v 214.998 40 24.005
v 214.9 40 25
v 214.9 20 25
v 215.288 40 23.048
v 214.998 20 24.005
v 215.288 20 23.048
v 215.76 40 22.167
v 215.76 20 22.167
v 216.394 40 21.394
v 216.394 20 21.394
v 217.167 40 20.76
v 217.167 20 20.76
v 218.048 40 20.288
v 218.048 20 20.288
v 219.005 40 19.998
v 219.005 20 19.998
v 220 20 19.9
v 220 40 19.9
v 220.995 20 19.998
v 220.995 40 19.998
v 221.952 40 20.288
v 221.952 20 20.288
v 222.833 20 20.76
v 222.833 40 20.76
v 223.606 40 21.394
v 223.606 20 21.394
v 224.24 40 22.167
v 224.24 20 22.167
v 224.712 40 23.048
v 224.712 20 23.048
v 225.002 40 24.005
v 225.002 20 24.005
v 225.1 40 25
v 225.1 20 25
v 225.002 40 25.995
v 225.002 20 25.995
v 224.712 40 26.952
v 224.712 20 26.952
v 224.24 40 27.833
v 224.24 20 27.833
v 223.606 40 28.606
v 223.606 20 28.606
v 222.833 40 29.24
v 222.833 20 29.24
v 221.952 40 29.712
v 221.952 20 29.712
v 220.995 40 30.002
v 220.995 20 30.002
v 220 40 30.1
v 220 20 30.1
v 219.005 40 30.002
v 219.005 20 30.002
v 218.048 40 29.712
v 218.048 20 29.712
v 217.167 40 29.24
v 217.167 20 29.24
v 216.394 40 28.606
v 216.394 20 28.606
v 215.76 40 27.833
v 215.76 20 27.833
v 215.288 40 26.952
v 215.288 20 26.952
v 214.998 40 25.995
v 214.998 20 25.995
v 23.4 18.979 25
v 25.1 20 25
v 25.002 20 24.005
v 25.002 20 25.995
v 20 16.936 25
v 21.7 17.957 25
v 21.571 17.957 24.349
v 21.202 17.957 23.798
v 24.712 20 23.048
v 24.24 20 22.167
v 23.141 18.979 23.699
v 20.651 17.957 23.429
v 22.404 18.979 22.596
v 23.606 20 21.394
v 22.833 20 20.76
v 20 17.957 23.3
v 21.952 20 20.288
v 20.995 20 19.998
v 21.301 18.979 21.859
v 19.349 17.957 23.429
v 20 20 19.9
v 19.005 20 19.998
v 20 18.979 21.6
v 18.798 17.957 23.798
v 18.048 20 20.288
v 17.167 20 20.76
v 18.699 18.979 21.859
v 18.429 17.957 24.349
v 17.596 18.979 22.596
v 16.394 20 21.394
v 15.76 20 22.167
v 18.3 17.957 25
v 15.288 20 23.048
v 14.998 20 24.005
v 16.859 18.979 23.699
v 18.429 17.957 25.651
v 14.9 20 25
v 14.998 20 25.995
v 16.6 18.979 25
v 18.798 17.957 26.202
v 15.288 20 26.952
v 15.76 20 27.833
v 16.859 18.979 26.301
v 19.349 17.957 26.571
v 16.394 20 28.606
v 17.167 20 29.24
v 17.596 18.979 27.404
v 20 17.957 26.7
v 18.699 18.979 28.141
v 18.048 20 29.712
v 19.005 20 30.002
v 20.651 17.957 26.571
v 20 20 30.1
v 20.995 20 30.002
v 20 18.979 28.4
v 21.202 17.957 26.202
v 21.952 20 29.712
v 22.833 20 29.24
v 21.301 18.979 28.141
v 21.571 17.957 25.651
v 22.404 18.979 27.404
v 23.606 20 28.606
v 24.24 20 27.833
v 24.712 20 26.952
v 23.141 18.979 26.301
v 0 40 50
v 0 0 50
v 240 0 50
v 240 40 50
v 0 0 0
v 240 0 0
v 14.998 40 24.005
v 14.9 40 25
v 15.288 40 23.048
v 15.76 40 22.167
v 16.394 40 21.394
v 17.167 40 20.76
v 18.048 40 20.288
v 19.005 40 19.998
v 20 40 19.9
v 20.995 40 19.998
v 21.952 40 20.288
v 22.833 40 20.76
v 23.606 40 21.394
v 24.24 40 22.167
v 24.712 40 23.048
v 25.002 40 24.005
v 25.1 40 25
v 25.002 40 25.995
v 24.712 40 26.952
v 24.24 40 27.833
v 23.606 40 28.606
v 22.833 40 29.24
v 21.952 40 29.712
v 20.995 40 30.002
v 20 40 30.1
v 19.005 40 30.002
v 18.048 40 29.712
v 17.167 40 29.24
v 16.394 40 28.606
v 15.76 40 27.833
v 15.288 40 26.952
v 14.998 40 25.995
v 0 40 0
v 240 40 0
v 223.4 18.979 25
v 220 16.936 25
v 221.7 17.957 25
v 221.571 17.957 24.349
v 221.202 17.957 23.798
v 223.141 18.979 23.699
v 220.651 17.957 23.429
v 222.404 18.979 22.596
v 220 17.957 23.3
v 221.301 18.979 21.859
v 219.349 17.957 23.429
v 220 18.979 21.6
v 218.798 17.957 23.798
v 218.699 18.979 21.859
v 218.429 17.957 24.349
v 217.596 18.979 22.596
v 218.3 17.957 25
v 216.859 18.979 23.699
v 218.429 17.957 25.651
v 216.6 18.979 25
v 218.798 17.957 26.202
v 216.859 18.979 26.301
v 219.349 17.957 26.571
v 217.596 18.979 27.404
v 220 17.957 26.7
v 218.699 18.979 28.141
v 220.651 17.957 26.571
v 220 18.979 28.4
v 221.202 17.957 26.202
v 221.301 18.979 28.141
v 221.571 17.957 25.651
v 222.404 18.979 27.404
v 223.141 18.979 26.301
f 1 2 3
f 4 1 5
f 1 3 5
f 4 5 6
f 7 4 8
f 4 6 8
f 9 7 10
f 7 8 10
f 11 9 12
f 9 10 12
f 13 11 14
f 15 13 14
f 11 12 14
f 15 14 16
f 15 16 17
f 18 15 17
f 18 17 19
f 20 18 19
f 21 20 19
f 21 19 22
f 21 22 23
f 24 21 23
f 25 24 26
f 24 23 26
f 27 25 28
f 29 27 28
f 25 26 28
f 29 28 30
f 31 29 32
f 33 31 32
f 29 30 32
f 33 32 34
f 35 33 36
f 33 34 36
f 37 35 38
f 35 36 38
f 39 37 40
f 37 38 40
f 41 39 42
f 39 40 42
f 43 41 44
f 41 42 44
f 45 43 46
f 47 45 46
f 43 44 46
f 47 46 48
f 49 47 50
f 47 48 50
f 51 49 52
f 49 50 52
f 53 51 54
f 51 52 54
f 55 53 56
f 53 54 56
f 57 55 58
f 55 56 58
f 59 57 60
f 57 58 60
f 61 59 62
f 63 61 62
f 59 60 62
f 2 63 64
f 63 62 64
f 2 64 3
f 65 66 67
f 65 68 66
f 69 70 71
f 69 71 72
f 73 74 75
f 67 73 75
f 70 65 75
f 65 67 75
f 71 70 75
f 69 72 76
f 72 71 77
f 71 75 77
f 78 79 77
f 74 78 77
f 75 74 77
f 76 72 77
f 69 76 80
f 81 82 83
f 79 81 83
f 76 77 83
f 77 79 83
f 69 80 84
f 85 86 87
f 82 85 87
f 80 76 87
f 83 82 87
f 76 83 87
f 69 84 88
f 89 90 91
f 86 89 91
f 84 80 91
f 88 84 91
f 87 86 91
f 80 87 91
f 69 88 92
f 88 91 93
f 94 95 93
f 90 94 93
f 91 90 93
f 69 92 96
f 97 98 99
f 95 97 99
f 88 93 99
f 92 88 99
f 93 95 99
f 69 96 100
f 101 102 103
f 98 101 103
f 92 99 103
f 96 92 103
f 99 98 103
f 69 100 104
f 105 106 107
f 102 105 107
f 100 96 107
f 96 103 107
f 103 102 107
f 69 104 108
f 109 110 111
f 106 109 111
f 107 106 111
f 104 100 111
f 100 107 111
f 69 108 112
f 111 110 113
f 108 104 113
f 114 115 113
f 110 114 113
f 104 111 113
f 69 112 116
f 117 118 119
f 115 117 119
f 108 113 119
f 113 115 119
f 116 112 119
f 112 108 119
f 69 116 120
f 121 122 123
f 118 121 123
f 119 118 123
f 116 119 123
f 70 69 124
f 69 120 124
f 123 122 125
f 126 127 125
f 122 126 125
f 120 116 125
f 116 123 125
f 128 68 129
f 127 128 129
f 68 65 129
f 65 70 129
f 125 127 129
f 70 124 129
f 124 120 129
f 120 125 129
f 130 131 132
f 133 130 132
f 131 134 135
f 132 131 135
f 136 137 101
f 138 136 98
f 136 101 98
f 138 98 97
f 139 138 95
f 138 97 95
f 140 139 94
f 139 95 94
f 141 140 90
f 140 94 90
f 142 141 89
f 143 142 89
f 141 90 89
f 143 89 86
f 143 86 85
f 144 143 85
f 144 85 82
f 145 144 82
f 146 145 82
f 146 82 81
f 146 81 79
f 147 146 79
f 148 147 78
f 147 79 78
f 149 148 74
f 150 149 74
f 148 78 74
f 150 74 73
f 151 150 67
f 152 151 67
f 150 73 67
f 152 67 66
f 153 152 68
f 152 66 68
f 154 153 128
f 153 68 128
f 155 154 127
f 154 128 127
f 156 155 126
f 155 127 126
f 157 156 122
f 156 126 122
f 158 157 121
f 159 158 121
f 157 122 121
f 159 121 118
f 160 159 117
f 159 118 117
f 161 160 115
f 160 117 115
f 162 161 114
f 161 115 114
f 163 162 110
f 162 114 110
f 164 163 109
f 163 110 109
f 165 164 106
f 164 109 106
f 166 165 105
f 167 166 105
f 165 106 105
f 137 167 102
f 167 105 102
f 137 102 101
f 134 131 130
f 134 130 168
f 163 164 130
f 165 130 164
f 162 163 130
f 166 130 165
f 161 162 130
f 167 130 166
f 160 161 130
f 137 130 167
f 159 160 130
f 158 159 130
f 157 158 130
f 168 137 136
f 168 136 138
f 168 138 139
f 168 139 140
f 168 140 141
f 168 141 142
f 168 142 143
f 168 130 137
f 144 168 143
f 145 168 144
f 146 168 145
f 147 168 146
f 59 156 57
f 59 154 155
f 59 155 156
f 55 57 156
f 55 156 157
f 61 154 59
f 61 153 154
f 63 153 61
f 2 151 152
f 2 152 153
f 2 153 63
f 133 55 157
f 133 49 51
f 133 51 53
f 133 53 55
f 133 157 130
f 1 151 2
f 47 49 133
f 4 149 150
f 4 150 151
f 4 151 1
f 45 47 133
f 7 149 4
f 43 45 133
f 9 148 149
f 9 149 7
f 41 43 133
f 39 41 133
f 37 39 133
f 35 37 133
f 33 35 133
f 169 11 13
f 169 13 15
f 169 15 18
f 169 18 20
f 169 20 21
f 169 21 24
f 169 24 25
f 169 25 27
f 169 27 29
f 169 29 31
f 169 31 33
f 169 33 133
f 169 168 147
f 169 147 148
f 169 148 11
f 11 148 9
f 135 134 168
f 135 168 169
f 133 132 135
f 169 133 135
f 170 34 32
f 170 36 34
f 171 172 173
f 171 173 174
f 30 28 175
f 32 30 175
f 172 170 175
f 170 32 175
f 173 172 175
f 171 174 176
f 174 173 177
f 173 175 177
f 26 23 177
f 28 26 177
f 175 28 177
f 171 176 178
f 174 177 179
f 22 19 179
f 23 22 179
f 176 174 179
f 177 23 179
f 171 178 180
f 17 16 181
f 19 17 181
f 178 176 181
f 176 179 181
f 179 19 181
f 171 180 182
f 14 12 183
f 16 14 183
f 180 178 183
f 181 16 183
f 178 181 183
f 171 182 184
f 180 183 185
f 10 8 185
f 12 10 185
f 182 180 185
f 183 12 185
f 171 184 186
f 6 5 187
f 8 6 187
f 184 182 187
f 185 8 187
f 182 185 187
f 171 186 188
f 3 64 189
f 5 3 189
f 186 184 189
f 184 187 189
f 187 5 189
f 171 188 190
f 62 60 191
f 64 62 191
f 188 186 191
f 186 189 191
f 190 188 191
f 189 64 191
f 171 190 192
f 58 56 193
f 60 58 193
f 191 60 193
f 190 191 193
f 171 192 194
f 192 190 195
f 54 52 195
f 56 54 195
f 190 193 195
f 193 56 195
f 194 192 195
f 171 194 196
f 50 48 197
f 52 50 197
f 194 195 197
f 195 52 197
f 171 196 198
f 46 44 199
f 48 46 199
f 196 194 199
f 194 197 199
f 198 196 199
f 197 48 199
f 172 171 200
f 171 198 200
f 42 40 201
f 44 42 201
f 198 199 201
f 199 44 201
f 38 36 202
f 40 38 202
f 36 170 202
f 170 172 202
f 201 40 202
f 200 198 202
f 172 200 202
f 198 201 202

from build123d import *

# Parameters (mm, degrees)
SKETCH1_W                   = 240
SKETCH1_H                   = 50
BOSS_EXTRUDE1_DEPTH         = 40
M12X1_75_TAPPED_HOLE1_D     = 10.2
M12X1_75_TAPPED_HOLE1_DEPTH = 20
M12X1_75_TAPPED_HOLE1_TIP   = 3.064389157


with BuildPart() as part:
    # Sketch1 → Boss-Extrude1 (new body)
    with BuildSketch(Plane(origin=(0, 0, 0), x_dir=(1, 0, 0), z_dir=(0, 1, 0))):
        with Locations((120, -25)):
            Rectangle(SKETCH1_W, SKETCH1_H)
    extrude(amount=BOSS_EXTRUDE1_DEPTH)

    # M12x1.75 Tapped Hole1
    with Locations(Plane(origin=(0, 40, 0), x_dir=(1, 0, 0), z_dir=(0, 1, 0))):
        with Locations((20, -25), (220, -25)):
            Hole(M12X1_75_TAPPED_HOLE1_D / 2, depth=M12X1_75_TAPPED_HOLE1_DEPTH)
            with Locations((0, 0, -(M12X1_75_TAPPED_HOLE1_DEPTH + M12X1_75_TAPPED_HOLE1_TIP / 2))):  # 118° drill point
                Cone(0, M12X1_75_TAPPED_HOLE1_D / 2, M12X1_75_TAPPED_HOLE1_TIP, mode=Mode.SUBTRACT)


solid = part.part
